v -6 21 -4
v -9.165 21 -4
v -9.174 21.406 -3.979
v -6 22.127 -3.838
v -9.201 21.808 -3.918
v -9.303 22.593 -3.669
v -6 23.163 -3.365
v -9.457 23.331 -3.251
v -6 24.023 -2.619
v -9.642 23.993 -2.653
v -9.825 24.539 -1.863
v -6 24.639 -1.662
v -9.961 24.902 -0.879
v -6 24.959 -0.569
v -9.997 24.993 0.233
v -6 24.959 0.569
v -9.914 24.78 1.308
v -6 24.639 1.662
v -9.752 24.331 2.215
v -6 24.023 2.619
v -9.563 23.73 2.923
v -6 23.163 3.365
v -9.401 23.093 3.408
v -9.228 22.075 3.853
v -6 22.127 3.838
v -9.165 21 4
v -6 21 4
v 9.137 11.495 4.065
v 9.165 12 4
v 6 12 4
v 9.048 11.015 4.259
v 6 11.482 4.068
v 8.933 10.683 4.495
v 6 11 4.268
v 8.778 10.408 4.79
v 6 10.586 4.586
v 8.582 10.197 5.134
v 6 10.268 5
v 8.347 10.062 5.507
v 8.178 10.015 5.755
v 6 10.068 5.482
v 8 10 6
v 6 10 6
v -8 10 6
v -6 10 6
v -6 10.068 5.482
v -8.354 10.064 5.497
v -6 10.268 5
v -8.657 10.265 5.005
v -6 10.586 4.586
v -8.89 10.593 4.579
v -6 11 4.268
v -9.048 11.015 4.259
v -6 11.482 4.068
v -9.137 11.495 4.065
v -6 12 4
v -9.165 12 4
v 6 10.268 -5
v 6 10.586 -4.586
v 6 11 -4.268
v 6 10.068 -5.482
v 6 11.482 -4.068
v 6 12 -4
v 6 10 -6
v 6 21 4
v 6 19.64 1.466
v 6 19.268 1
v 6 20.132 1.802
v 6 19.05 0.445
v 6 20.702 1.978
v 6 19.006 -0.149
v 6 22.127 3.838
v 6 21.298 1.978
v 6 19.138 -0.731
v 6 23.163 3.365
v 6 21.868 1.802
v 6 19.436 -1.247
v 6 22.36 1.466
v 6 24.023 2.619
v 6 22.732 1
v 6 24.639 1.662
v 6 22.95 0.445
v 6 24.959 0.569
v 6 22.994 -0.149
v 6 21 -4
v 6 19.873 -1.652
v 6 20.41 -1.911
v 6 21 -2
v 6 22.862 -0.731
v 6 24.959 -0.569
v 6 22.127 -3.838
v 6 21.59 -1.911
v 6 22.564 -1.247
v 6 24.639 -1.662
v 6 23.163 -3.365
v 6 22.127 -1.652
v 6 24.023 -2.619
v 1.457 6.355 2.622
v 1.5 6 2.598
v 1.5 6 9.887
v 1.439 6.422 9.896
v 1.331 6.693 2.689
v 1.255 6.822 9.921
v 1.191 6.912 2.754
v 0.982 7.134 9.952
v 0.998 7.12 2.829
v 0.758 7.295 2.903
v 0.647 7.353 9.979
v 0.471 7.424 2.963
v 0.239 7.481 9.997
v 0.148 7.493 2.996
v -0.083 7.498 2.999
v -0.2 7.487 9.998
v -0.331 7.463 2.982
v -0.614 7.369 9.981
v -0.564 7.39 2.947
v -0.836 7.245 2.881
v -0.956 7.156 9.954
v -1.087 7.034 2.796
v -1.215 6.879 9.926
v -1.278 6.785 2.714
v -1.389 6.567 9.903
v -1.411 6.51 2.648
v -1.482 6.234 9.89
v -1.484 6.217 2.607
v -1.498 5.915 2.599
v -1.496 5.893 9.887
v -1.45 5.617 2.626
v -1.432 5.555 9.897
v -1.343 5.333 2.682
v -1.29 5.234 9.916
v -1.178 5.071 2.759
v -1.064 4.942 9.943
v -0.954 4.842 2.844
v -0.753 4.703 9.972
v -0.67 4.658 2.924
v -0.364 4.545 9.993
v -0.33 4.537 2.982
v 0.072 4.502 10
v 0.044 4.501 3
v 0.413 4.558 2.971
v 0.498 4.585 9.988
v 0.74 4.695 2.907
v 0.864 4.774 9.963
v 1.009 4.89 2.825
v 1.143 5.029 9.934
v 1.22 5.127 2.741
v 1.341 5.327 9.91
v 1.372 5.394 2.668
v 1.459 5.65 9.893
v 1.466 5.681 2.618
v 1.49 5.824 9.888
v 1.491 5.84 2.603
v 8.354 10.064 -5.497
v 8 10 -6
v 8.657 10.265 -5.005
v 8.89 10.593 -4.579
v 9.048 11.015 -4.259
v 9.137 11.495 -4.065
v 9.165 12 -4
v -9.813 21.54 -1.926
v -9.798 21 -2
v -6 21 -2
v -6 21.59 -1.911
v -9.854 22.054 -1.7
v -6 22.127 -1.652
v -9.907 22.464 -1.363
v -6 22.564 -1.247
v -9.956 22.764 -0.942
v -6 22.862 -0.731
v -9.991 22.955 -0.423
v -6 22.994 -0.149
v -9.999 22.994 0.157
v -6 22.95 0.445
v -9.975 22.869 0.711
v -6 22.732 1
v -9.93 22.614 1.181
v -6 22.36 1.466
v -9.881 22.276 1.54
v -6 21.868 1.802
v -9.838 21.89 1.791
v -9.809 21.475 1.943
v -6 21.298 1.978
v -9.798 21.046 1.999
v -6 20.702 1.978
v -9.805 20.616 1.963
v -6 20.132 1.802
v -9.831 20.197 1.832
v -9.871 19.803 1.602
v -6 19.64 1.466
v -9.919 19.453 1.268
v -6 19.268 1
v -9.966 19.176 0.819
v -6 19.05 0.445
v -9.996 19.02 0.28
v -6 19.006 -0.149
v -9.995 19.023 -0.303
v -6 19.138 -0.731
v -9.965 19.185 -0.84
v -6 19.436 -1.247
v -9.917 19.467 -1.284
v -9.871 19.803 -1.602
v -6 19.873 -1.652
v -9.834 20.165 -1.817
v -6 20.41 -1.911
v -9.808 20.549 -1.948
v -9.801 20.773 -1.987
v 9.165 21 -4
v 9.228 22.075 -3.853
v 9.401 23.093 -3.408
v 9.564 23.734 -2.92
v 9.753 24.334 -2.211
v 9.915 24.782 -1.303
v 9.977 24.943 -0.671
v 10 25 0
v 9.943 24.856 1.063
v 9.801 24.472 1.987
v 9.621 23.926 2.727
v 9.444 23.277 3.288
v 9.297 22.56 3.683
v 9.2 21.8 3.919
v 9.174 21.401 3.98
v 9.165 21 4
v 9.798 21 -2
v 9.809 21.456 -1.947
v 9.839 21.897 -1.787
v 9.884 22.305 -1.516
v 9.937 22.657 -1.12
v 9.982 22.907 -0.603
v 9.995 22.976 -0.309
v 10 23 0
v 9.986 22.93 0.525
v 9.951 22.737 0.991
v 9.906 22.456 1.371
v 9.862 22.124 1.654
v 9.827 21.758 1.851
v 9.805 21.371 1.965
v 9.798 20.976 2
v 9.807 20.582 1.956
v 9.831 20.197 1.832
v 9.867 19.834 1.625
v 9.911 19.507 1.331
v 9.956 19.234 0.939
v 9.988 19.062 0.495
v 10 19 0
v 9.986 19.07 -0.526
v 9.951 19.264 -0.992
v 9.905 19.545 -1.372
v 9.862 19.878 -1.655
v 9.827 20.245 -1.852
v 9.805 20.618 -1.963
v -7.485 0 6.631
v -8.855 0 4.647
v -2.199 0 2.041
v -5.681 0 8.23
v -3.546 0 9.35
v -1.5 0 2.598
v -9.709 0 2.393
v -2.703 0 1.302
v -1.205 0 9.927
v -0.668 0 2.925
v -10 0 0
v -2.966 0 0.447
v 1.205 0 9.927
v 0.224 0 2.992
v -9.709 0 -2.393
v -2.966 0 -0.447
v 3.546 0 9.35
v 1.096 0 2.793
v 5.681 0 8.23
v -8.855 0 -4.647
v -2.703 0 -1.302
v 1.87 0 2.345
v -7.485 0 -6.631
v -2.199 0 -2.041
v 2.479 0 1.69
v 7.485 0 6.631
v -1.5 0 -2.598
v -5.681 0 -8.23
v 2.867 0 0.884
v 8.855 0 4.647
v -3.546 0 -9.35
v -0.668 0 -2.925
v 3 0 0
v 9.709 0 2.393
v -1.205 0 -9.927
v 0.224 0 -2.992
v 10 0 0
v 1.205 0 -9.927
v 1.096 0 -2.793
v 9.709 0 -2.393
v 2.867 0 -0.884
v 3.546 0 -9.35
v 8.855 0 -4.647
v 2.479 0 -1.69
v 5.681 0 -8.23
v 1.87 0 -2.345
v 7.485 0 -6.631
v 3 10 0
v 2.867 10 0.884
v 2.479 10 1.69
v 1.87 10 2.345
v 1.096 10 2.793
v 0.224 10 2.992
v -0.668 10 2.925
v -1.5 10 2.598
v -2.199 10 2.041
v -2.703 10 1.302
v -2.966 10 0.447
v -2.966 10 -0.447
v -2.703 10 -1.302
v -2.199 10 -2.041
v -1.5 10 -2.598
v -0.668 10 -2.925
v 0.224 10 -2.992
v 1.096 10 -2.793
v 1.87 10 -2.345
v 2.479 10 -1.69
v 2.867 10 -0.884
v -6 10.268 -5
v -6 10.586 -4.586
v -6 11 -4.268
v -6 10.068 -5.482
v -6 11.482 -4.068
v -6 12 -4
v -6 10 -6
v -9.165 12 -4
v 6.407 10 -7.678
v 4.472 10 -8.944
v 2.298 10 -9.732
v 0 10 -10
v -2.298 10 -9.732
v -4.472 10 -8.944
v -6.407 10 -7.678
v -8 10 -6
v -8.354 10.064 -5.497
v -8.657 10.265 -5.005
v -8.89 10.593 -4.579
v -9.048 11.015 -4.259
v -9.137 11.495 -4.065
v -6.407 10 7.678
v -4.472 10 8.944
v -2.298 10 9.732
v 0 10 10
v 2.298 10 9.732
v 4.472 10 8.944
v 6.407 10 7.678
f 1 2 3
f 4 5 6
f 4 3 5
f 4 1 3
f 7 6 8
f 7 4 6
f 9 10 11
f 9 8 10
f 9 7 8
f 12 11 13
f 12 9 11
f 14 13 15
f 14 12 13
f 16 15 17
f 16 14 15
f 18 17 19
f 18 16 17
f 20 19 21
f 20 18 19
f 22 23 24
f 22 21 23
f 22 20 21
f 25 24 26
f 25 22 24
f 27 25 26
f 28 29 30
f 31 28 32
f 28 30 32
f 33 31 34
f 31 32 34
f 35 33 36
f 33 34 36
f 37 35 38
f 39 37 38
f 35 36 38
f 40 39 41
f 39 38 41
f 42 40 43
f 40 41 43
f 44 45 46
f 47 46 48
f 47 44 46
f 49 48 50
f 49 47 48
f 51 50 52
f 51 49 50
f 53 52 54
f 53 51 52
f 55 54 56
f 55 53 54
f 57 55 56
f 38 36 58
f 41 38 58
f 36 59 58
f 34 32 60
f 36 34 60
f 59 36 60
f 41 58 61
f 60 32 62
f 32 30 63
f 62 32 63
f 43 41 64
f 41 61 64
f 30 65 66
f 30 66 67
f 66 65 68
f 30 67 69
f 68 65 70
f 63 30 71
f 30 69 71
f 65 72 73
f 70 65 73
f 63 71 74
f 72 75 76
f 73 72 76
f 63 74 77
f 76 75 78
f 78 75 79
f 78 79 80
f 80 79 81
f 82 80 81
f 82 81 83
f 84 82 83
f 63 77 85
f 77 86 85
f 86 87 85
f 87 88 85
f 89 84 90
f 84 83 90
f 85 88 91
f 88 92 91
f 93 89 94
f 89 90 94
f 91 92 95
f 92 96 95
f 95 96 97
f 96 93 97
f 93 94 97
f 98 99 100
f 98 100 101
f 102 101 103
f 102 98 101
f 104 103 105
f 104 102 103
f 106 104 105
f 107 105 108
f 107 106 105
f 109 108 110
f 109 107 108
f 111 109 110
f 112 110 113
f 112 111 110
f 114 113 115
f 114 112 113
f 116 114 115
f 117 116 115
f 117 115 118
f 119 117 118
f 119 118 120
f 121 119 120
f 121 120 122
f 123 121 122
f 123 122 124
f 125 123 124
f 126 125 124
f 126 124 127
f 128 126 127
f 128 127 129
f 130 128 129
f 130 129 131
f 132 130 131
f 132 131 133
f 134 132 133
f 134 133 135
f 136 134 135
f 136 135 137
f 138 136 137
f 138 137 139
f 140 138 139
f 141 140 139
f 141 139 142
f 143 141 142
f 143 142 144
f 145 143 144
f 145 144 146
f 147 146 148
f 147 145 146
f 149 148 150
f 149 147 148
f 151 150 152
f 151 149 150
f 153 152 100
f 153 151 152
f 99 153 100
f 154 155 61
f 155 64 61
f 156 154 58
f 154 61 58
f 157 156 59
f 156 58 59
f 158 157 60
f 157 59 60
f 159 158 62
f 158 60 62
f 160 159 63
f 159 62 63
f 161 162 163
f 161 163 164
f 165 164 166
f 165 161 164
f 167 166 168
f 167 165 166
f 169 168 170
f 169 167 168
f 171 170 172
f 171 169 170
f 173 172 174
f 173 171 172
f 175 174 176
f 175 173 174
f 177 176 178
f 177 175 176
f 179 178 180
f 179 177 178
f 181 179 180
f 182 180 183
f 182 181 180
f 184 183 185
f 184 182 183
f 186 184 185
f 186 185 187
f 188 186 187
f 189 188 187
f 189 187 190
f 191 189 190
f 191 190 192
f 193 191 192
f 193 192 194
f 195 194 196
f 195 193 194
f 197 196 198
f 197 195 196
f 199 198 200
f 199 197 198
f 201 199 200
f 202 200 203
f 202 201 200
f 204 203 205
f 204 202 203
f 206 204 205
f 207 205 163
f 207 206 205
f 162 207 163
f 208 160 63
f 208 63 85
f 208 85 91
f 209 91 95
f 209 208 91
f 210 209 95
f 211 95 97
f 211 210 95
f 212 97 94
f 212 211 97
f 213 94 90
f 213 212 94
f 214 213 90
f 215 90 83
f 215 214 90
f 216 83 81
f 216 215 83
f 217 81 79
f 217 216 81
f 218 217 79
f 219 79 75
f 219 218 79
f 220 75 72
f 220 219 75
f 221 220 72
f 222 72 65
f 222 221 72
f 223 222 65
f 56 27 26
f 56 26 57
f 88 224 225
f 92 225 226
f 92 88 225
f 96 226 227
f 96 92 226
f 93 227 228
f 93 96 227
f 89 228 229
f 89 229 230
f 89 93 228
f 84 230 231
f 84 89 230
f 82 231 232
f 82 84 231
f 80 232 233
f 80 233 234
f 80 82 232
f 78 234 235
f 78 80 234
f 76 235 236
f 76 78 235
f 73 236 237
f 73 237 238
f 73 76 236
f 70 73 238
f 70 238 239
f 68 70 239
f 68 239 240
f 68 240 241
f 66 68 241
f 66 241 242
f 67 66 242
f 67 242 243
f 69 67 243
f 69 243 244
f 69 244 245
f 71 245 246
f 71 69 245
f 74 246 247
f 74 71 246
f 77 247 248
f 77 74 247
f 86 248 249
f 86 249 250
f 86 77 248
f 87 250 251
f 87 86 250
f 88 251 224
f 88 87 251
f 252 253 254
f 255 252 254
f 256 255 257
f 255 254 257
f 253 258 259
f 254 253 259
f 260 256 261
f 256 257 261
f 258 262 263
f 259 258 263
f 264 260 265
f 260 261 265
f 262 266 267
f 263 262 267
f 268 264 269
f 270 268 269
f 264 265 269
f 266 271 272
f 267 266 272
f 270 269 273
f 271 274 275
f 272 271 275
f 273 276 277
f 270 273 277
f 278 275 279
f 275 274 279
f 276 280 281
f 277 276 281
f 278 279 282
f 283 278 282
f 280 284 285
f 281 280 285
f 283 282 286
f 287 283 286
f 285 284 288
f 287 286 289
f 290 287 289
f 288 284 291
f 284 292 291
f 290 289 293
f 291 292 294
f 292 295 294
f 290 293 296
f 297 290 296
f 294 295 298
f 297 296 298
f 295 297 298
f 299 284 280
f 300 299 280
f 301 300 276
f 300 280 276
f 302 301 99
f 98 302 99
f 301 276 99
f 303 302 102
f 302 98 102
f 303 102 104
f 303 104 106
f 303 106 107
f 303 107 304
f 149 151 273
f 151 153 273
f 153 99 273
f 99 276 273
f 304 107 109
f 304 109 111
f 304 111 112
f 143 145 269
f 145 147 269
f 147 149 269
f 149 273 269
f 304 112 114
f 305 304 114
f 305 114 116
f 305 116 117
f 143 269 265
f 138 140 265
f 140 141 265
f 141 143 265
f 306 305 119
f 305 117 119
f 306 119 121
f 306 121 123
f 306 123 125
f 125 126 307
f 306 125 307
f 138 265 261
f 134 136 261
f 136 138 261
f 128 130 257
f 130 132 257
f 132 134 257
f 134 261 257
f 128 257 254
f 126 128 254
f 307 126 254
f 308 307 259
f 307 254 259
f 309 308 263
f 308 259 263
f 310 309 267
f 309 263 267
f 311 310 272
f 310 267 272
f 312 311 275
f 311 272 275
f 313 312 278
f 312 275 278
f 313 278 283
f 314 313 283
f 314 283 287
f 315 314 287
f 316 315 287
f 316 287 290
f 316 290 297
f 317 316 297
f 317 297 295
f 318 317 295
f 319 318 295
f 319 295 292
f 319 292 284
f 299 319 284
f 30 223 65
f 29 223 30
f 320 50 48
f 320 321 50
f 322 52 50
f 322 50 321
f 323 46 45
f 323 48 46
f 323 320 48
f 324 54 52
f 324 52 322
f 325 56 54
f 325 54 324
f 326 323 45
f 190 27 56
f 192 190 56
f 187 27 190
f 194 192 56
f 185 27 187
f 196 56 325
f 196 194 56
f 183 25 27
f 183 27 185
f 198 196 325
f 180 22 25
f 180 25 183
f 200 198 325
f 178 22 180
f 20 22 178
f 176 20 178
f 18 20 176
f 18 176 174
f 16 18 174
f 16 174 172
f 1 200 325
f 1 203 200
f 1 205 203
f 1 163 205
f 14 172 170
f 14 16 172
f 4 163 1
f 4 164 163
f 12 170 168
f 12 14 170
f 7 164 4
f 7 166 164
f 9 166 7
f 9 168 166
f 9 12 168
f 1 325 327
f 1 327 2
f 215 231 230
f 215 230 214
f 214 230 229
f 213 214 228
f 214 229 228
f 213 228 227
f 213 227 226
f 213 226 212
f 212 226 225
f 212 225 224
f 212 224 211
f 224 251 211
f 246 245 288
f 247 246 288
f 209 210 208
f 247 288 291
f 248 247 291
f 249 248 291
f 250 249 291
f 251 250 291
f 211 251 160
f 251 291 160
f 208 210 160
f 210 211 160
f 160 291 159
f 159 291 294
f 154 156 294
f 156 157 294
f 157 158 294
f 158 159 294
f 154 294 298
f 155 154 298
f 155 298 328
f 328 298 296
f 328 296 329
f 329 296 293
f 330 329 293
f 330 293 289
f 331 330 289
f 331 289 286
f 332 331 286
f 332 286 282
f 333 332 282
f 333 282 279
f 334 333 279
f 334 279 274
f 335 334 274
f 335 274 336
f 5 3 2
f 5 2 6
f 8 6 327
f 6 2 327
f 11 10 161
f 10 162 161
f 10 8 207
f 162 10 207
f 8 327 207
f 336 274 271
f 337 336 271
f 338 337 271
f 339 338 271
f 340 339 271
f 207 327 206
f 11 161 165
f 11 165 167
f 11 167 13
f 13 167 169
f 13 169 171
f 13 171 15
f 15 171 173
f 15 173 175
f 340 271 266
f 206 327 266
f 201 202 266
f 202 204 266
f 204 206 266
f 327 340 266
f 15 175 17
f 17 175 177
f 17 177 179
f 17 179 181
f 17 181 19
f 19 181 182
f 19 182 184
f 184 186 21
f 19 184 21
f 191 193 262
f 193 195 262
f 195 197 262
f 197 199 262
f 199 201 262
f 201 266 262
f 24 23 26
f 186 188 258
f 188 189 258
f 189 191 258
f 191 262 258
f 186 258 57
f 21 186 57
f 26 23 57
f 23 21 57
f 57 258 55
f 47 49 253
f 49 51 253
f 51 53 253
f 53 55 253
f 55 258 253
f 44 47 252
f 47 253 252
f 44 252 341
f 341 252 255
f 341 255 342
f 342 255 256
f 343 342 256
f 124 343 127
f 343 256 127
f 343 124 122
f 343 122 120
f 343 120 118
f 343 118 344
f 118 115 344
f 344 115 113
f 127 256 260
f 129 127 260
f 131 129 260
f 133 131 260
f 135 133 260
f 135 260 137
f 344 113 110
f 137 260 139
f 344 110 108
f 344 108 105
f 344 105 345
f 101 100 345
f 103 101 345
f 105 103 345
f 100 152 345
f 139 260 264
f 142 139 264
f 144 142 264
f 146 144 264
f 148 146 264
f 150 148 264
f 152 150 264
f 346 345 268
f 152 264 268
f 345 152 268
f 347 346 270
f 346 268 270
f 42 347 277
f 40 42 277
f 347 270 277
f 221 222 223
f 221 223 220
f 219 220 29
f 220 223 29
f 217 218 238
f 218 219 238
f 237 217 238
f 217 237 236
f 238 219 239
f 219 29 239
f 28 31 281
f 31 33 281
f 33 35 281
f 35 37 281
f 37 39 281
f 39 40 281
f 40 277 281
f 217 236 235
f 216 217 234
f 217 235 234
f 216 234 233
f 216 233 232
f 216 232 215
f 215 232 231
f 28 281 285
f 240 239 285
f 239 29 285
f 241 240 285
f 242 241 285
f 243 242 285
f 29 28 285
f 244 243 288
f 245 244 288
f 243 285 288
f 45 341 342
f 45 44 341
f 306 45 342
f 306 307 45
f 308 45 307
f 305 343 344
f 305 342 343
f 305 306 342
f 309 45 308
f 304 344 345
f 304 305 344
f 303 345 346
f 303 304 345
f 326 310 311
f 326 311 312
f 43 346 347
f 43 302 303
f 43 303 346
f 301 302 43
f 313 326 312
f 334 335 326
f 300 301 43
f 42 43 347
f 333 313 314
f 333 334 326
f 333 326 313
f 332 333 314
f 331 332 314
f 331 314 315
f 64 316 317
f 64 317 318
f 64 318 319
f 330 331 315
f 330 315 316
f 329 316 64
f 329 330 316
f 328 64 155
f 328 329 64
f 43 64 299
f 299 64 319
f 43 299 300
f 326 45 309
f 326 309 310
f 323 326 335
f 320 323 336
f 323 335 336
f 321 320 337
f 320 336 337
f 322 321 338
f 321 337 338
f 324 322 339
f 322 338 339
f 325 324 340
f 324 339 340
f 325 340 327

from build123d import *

# Parameters (mm, degrees)
SKETCH_1_W          = 20
SKETCH_1_H          = 20
EXTRUDE_1_DEPTH     = 10
SKETCH_2_R          = 2
EXTRUDE_2_DEPTH     = 10
SKETCH_2_2_R        = 2
CUT_EXTRUDE_1_DEPTH = 6
SKETCH_4_OUTSIDE_W  = 29.55
SKETCH_4_OUTSIDE_H  = 29.55
SKETCH_4_OUTSIDE_R  = 10
CUT_EXTRUDE_2_DEPTH = 26
SKETCH_5_R          = 3
CUT_EXTRUDE_3_DEPTH = 26.0000001
SKETCH_6_R          = 1.5
CUT_EXTRUDE_4_DEPTH = 11.0000001
FILLET_1_R          = 2


with BuildPart() as part:
    # 草圖1 → 填料-伸長1 (new body)
    with BuildSketch(Plane(origin=(0, 0, 0), x_dir=(1, 0, 0), z_dir=(0, 1, 0))):
        Rectangle(SKETCH_1_W, SKETCH_1_H)
    extrude(amount=EXTRUDE_1_DEPTH)

    # 草圖2 → 填料-伸長2 (add, symmetric)
    with BuildSketch(Plane(origin=(0, 0, 0), x_dir=(0, 0, -1), z_dir=(1, 0, 0))):
        with BuildLine():
            Line((4, 10), (4, 21))
            ThreePointArc((4, 21), (0, 25), (-4, 21))
            Line((-4, 21), (-4, 10))
            Line((-4, 10), (4, 10))
        make_face()
        with Locations((0, 21)):
            Circle(SKETCH_2_R, mode=Mode.SUBTRACT)
    extrude(amount=EXTRUDE_2_DEPTH, both=True)

    # 草圖2<2> → 除料-伸長1 (cut, symmetric)
    with BuildSketch(Plane(origin=(0, 0, 0), x_dir=(0, 0, -1), z_dir=(1, 0, 0))):
        with BuildLine():
            Line((4, 10), (4, 21))
            ThreePointArc((4, 21), (0, 25), (-4, 21))
            Line((-4, 21), (-4, 10))
            Line((-4, 10), (4, 10))
        make_face()
        with Locations((0, 21)):
            Circle(SKETCH_2_2_R, mode=Mode.SUBTRACT)
    extrude(amount=CUT_EXTRUDE_1_DEPTH, both=True, mode=Mode.SUBTRACT)

    # 草圖4 outside → 除料-伸長2 (cut, through all)
    with BuildSketch(Plane(origin=(0, 0, 0), x_dir=(1, 0, 0), z_dir=(0, 1, 0))):
        Rectangle(SKETCH_4_OUTSIDE_W, SKETCH_4_OUTSIDE_H)
        Circle(SKETCH_4_OUTSIDE_R, mode=Mode.SUBTRACT)
    extrude(amount=CUT_EXTRUDE_2_DEPTH, mode=Mode.SUBTRACT)

    # 草圖5 → 除料-伸長3 (cut, through all)
    with BuildSketch(Plane.XZ):
        Circle(SKETCH_5_R)
    extrude(amount=-CUT_EXTRUDE_3_DEPTH, mode=Mode.SUBTRACT)

    # 草圖6 → 除料-伸長4 (cut, through all)
    with BuildSketch(Plane.XY):
        with Locations((0, 6)):
            Circle(SKETCH_6_R)
    extrude(amount=CUT_EXTRUDE_4_DEPTH, mode=Mode.SUBTRACT)

    # 圓角1
    fillet_1_edges = [part.edges().sort_by_distance(p)[0] for p in [
        (-7.582575695, 10, 4),
        (-7.582575695, 10, -4),
        (7.582575695, 10, 4),
        (7.582575695, 10, -4),
    ]]
    fillet(fillet_1_edges, radius=FILLET_1_R)


solid = part.part
